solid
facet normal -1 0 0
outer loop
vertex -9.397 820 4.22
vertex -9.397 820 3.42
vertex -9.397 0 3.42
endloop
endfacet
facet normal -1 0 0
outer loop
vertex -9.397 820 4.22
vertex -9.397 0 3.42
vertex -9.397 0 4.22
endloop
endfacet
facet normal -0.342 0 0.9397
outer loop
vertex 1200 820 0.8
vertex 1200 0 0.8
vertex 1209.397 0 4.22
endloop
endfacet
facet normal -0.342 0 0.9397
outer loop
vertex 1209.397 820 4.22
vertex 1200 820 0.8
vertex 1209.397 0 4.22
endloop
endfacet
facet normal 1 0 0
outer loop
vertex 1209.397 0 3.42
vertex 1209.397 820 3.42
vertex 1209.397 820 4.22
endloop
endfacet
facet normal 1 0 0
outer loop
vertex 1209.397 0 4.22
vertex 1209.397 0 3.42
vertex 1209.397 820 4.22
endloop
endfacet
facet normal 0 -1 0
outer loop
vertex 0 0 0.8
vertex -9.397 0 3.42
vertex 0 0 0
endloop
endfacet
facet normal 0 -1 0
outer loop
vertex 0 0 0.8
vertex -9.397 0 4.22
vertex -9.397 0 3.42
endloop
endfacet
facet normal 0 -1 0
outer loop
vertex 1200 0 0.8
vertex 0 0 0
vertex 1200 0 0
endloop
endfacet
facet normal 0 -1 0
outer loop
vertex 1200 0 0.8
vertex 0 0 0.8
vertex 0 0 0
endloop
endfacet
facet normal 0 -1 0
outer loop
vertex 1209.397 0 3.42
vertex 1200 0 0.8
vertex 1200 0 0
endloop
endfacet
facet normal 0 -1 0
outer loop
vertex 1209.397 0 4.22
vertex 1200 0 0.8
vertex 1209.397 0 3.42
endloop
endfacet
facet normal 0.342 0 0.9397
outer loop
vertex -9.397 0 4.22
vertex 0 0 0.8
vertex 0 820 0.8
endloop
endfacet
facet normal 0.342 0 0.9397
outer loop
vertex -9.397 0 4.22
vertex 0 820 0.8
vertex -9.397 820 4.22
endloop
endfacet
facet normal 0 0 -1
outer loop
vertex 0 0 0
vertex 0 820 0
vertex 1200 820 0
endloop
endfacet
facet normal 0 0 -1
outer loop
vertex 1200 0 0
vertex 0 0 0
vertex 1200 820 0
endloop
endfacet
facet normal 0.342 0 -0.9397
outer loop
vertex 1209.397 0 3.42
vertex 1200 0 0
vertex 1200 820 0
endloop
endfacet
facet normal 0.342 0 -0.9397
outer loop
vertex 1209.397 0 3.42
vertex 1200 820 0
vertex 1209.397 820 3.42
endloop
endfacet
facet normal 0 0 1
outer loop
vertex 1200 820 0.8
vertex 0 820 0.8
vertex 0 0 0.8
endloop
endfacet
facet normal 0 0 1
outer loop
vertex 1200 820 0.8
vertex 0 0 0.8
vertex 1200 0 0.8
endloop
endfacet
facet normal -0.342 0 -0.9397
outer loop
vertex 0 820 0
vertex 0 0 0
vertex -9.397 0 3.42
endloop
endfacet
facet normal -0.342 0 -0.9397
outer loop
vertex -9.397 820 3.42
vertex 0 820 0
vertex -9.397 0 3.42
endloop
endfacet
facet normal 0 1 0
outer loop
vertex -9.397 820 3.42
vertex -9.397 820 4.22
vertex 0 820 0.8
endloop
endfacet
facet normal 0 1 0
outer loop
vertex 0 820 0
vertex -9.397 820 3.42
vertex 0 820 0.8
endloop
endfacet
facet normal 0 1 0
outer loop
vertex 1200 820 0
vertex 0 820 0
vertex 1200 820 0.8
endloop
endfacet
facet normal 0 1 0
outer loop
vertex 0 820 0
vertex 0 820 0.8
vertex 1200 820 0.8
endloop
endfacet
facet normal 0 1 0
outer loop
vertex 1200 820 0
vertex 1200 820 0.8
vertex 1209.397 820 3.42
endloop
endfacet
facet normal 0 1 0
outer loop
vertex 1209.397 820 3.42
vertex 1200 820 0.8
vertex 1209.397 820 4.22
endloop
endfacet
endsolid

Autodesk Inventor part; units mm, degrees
ref_plane "YZ Plane" through (0, 0, 0) normal (1, 0, 0) x (0, 1, 0)
ref_plane "XZ Plane" through (0, 0, 0) normal (0, 1, 0) x (-1, 0, 0)
ref_plane "XY Plane" through (0, 0, 0) normal (0, 0, 1) x (1, 0, 0)
sketch "Sketch1" plane through (0, 0, 0) normal (0, 0, 1) x (1, 0, 0)
  line L0 (0, 0) -> (1200, 0)
  line L1 (1200, 0) -> (1200, 820)
  line L2 (1200, 820) -> (0, 820)
  line L3 (0, 820) -> (0, 0)
  dimension "d0" = 820
  dimension "d1" = 1200
extrude "Extrusion1" add sketch "Sketch1" along normal blind 0.8
sketch "Sketch4" plane through (0, 0, 0) normal (0, -1, 0) x (1, 0, 0)
  line L0 (1200, 0) -> (0, 0) projected
  line L1 (0, 0) -> (-9.3969, 3.4202)
  line L2 (0, 0) -> (0, 0.8) projected
  line L3 (0, 0.8) -> (-9.3969, 4.2202)
  line L4 (-9.3969, 3.4202) -> (-9.3969, 4.2202)
  dimension "d16" = 70
  dimension "d17" = 10
  dimension "d18" = 70
  dimension "d19" = 10
extrude "Extrusion4" add sketch "Sketch4" against normal up to surface (820 mm away)
sketch "Sketch5" plane through (0, 0, 0) normal (0, -1, 0) x (1, 0, 0)
  line L0 (1200, 0) -> (1200, 0.8) projected
  line L1 (1200, 0) -> (1209.3969, 3.4202)
  line L2 (1200, 0.8) -> (1209.3969, 4.2202)
  line L3 (1209.3969, 3.4202) -> (1209.3969, 4.2202)
  point P0 (0, 0)
  dimension "d22" = 70
  dimension "d23" = 10
  dimension "d24" = 70
  dimension "d25" = 10
extrude "Extrusion5" add sketch "Sketch5" against normal up to surface (820 mm away)
sketch "Sketch7" plane through (0, 0, 0.8) normal (0, 0, 1) x (1, 0, 0)
  circle A0 centre (56.6674, 837.4999) radius 7.5 projected
  line L0 (19.1715, 870) -> (19.1715, -50) projected
  circle A1 centre (1126.6715, 837.4999) radius 7.5
  line L1 (1159.1715, 870) -> (1159.1715, -50) projected
  point P0 (0, 0)
  dimension "d30" = 15
  dimension "d31" = 32.5
extrude "Extrusion6" cut sketch "Sketch7" against normal blind 10
ref_plane "Work Plane2" through (0, 410, 0) normal (0, -1, 0) x (1, 0, 0)
mirror "Mirror2" about plane through (0, 410, 0) normal (0, -1, 0) of "Extrusion6"
properties part number "Ke_Bang_Tai"
